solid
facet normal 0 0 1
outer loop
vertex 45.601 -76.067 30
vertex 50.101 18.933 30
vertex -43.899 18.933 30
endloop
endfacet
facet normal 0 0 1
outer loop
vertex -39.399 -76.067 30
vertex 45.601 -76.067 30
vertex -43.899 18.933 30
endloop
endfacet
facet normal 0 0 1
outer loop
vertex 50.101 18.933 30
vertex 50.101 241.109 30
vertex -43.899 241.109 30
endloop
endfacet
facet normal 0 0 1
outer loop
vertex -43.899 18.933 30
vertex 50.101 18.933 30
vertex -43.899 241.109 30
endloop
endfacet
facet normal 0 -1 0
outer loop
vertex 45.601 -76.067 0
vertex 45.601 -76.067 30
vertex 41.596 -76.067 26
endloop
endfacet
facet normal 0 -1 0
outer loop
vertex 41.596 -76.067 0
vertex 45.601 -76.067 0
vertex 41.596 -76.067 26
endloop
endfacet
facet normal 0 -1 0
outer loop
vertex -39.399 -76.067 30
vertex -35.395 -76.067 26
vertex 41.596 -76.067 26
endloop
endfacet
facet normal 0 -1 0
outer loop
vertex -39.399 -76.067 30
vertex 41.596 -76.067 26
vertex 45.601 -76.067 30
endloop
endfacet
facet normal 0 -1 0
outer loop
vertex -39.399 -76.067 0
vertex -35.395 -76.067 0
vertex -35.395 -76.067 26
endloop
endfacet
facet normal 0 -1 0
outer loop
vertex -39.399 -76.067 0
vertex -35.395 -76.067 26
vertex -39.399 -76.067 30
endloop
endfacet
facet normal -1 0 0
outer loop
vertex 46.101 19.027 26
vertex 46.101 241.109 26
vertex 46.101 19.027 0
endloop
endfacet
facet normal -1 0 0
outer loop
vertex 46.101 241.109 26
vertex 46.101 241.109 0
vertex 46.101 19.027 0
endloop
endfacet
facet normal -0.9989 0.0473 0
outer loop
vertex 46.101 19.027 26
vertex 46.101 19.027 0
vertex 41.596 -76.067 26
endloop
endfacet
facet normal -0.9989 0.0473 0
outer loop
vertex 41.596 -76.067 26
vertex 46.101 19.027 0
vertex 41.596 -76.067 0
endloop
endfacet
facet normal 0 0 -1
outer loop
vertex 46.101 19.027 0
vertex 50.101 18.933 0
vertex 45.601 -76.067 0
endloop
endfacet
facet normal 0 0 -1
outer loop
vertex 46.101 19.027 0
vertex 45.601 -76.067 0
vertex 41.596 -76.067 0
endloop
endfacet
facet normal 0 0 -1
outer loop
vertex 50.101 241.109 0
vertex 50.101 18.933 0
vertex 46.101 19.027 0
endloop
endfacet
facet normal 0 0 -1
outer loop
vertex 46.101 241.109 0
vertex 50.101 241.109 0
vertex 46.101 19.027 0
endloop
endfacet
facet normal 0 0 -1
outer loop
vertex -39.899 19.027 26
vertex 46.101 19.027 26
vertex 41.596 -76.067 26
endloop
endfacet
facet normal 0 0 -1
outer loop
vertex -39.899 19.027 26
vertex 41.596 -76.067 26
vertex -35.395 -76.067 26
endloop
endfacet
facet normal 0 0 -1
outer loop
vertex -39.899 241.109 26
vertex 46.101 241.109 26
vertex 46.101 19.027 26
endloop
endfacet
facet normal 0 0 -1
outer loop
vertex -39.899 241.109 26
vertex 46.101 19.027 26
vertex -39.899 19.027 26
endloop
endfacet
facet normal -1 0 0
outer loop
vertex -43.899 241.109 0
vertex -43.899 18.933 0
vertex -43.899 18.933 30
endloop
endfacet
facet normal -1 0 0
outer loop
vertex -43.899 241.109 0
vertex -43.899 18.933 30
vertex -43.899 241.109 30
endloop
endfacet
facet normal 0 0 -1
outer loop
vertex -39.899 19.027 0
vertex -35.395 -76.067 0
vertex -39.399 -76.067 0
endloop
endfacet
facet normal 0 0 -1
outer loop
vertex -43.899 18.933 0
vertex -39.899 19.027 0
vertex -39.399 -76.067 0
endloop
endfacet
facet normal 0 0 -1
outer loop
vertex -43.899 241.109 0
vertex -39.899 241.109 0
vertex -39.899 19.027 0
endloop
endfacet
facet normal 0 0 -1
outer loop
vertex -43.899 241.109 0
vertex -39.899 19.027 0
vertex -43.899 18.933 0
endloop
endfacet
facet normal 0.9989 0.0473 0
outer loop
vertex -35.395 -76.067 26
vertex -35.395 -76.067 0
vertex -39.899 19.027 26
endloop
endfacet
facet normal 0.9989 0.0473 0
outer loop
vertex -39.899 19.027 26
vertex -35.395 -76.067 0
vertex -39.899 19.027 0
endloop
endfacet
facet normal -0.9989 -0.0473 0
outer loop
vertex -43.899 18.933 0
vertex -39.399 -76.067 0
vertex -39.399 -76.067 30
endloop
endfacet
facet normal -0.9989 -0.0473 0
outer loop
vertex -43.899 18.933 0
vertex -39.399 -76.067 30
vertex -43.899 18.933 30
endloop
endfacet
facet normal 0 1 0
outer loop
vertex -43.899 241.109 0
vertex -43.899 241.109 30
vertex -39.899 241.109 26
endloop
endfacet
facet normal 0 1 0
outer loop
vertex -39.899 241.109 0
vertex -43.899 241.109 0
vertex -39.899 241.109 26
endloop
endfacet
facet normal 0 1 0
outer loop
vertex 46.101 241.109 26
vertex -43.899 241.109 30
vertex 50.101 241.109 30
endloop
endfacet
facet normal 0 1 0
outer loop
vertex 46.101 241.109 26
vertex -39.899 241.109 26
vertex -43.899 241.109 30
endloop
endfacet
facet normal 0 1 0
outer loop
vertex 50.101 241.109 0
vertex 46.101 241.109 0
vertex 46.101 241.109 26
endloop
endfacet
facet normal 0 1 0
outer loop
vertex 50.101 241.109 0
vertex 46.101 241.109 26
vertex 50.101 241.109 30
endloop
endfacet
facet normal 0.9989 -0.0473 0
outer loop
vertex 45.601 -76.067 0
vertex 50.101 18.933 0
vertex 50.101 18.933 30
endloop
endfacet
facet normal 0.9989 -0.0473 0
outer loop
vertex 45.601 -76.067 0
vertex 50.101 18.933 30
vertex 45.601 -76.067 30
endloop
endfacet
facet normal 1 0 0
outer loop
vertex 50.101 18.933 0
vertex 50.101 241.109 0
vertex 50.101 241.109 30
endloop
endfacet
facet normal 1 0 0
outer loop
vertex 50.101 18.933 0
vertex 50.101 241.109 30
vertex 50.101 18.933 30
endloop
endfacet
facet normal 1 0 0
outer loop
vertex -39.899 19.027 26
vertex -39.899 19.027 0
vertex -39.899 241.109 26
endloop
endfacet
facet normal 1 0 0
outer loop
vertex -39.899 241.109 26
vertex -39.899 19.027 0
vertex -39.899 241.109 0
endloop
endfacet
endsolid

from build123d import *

# Parameters (mm, degrees)
DODANIE_WYCI_GNI_CIE1_DEPTH = 30
SKORUPA2_T                  = -4


with BuildPart() as part:
    # Szkic1 → Dodanie-wyciągnięcie1 (new body)
    with BuildSketch(Plane.XY):
        Polygon((-43.89930842, 241.108747994), (50.10069158, 241.108747994), (50.10069158, 18.932504013), (45.60069158, -76.067495987), (-39.39930842, -76.067495987), (-43.89930842, 18.932504013), align=None)
    extrude(amount=DODANIE_WYCI_GNI_CIE1_DEPTH)

    # Skorupa2
    skorupa2_openings = [part.faces().sort_by_distance(p)[0] for p in [
        (3.10069158, 241.108747994, 15),
        (3.10069158, -76.067495987, 15),
        (3.10069158, 84.366979784, 0),
    ]]
    offset(amount=SKORUPA2_T, openings=skorupa2_openings, kind=Kind.INTERSECTION)


solid = part.part
